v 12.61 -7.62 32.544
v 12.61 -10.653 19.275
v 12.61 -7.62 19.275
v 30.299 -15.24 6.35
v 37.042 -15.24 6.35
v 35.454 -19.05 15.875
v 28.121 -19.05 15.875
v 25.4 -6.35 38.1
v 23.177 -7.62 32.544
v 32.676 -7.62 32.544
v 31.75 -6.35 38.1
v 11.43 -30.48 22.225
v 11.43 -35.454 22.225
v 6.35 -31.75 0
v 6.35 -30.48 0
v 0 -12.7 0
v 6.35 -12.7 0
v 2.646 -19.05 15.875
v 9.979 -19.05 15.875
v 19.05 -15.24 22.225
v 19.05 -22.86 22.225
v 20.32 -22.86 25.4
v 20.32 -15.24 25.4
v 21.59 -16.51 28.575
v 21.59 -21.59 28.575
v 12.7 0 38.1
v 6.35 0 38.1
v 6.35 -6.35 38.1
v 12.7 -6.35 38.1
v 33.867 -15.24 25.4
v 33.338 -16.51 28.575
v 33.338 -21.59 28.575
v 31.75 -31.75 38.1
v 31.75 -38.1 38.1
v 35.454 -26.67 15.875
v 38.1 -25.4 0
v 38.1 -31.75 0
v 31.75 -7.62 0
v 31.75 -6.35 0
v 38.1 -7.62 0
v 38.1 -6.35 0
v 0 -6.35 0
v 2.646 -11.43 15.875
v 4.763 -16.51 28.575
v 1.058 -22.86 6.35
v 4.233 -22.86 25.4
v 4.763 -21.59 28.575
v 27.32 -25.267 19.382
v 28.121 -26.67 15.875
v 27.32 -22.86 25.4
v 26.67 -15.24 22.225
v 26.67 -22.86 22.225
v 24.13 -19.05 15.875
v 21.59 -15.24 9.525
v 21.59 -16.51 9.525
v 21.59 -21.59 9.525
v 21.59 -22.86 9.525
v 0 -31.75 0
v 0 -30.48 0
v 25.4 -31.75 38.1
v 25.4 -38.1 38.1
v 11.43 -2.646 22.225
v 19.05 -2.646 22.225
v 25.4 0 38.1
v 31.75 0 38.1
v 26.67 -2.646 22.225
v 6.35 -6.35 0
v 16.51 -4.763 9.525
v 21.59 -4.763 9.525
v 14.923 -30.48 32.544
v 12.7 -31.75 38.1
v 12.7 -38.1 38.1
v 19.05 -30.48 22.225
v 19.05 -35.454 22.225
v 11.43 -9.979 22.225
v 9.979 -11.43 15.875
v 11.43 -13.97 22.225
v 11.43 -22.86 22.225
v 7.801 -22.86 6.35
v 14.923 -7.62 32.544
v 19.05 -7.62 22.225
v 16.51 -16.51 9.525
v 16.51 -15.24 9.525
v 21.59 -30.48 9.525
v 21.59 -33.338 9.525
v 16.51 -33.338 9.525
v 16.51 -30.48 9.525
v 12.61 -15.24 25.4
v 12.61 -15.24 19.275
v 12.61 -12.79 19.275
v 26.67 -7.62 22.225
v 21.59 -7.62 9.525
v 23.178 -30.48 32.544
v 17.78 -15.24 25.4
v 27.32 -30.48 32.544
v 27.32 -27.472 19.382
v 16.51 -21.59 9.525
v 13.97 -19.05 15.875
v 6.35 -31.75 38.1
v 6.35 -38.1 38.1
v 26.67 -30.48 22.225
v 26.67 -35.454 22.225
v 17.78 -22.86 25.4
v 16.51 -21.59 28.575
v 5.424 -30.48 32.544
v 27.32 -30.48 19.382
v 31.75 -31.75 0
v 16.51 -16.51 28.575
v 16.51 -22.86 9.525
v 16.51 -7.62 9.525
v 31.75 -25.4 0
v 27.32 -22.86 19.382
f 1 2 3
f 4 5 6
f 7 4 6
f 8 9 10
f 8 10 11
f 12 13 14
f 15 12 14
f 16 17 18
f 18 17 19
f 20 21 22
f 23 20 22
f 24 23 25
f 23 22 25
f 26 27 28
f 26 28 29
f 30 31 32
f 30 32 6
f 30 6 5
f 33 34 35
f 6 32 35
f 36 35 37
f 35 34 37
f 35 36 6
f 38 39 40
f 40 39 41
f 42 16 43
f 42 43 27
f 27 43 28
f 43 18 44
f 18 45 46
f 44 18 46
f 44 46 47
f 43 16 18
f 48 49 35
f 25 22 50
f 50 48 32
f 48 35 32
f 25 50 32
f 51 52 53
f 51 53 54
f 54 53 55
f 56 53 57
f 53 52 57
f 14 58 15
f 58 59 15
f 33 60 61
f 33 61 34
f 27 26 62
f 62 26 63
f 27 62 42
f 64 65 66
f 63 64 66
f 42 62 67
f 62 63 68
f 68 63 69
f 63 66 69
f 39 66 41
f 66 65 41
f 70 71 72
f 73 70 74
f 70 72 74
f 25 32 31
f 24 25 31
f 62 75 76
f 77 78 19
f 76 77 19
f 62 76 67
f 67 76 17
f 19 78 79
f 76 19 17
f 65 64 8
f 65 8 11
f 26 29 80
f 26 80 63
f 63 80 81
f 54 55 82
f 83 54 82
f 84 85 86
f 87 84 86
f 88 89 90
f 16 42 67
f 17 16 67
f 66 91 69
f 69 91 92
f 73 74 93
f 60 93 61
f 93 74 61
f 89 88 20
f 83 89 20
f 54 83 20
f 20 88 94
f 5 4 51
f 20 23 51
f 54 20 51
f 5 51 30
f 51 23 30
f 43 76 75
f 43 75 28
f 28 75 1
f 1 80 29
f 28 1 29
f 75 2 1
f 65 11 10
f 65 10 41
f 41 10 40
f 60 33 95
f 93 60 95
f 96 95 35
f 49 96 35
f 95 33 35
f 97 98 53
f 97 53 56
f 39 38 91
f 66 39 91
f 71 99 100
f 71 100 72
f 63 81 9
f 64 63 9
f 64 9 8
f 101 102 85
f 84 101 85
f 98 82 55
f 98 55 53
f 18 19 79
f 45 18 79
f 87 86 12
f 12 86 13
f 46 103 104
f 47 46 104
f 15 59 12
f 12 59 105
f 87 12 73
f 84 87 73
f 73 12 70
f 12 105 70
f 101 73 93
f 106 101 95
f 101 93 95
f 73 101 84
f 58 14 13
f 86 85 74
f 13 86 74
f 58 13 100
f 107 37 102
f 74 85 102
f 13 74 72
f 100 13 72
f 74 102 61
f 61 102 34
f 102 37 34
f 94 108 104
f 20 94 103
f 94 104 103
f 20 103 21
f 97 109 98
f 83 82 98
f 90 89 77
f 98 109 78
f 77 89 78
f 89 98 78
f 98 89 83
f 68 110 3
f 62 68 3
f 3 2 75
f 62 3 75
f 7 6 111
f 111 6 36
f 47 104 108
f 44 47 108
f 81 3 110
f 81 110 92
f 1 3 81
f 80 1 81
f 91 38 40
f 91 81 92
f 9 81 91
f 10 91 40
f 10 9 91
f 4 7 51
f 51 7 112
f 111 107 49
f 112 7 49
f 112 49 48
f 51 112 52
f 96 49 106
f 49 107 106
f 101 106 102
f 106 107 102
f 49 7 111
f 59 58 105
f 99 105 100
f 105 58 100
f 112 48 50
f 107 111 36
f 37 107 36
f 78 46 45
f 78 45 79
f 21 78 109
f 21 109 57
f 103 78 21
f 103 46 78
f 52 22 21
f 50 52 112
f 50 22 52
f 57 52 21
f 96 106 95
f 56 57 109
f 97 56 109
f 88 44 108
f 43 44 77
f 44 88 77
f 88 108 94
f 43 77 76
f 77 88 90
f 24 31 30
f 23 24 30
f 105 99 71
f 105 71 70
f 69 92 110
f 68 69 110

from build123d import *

# Parameters (mm, degrees)
F0_W      = 38.1
F0_H      = 38.1
F1_DEPTH  = 38.1
F6_DEPTH  = 38.1
F8_DEPTH  = 38.1
F9_W      = 25.4898550868
F9_H      = 7.62
F9_W_2    = 27.3198056966
F10_DEPTH = 38.1


with BuildPart() as f1:
    # F0 (on Front) → F1 (new body)
    with BuildSketch(Plane.XZ):
        with Locations((19.05, 19.05)):
            Rectangle(F0_W, F0_H)
    extrude(amount=F1_DEPTH)

    # F5 (on offset) → F6 (cut)
    with BuildSketch(Plane.YZ.offset(38.1)):
        Polygon((-11.43, 15.875), (-6.35, 38.1), (-31.75, 38.1), (-26.67, 15.875), (-21.59, 28.575), (-16.51, 28.575), align=None)
        Polygon((-25.4, 0), (-12.7, 0), (-19.05, 15.875), align=None)
        Polygon((-38.1, 0), (-31.75, 0), (-38.1, 38.1), align=None)
        Polygon((-6.35, 0), (0, 0), (0, 38.1), align=None)
    extrude(amount=-F6_DEPTH, mode=Mode.SUBTRACT)

    # F7 (on offset) → F8 (cut)
    with BuildSketch(Plane.XZ.offset(38.1)):
        Polygon((25.4, 38.1), (12.7, 38.1), (19.05, 22.225), align=None)
        Polygon((11.43, 22.225), (6.35, 0), (31.75, 0), (26.67, 22.225), (21.59, 9.525), (16.51, 9.525), align=None)
        Polygon((0, 38.1), (0, 0), (6.35, 38.1), align=None)
        Polygon((31.75, 38.1), (38.1, 0), (38.1, 38.1), align=None)
    extrude(amount=-F8_DEPTH, mode=Mode.SUBTRACT)

    # F9 (on offset) → F10 (cut)
    with BuildSketch(Plane.XY.offset(38.1)):
        with Locations((25.3550724566, -11.43)):
            Rectangle(F9_W, F9_H)
        with Locations((13.6599028483, -26.67)):
            Rectangle(F9_W_2, F9_H)
    extrude(amount=-F10_DEPTH, mode=Mode.SUBTRACT)


solid = f1.part
